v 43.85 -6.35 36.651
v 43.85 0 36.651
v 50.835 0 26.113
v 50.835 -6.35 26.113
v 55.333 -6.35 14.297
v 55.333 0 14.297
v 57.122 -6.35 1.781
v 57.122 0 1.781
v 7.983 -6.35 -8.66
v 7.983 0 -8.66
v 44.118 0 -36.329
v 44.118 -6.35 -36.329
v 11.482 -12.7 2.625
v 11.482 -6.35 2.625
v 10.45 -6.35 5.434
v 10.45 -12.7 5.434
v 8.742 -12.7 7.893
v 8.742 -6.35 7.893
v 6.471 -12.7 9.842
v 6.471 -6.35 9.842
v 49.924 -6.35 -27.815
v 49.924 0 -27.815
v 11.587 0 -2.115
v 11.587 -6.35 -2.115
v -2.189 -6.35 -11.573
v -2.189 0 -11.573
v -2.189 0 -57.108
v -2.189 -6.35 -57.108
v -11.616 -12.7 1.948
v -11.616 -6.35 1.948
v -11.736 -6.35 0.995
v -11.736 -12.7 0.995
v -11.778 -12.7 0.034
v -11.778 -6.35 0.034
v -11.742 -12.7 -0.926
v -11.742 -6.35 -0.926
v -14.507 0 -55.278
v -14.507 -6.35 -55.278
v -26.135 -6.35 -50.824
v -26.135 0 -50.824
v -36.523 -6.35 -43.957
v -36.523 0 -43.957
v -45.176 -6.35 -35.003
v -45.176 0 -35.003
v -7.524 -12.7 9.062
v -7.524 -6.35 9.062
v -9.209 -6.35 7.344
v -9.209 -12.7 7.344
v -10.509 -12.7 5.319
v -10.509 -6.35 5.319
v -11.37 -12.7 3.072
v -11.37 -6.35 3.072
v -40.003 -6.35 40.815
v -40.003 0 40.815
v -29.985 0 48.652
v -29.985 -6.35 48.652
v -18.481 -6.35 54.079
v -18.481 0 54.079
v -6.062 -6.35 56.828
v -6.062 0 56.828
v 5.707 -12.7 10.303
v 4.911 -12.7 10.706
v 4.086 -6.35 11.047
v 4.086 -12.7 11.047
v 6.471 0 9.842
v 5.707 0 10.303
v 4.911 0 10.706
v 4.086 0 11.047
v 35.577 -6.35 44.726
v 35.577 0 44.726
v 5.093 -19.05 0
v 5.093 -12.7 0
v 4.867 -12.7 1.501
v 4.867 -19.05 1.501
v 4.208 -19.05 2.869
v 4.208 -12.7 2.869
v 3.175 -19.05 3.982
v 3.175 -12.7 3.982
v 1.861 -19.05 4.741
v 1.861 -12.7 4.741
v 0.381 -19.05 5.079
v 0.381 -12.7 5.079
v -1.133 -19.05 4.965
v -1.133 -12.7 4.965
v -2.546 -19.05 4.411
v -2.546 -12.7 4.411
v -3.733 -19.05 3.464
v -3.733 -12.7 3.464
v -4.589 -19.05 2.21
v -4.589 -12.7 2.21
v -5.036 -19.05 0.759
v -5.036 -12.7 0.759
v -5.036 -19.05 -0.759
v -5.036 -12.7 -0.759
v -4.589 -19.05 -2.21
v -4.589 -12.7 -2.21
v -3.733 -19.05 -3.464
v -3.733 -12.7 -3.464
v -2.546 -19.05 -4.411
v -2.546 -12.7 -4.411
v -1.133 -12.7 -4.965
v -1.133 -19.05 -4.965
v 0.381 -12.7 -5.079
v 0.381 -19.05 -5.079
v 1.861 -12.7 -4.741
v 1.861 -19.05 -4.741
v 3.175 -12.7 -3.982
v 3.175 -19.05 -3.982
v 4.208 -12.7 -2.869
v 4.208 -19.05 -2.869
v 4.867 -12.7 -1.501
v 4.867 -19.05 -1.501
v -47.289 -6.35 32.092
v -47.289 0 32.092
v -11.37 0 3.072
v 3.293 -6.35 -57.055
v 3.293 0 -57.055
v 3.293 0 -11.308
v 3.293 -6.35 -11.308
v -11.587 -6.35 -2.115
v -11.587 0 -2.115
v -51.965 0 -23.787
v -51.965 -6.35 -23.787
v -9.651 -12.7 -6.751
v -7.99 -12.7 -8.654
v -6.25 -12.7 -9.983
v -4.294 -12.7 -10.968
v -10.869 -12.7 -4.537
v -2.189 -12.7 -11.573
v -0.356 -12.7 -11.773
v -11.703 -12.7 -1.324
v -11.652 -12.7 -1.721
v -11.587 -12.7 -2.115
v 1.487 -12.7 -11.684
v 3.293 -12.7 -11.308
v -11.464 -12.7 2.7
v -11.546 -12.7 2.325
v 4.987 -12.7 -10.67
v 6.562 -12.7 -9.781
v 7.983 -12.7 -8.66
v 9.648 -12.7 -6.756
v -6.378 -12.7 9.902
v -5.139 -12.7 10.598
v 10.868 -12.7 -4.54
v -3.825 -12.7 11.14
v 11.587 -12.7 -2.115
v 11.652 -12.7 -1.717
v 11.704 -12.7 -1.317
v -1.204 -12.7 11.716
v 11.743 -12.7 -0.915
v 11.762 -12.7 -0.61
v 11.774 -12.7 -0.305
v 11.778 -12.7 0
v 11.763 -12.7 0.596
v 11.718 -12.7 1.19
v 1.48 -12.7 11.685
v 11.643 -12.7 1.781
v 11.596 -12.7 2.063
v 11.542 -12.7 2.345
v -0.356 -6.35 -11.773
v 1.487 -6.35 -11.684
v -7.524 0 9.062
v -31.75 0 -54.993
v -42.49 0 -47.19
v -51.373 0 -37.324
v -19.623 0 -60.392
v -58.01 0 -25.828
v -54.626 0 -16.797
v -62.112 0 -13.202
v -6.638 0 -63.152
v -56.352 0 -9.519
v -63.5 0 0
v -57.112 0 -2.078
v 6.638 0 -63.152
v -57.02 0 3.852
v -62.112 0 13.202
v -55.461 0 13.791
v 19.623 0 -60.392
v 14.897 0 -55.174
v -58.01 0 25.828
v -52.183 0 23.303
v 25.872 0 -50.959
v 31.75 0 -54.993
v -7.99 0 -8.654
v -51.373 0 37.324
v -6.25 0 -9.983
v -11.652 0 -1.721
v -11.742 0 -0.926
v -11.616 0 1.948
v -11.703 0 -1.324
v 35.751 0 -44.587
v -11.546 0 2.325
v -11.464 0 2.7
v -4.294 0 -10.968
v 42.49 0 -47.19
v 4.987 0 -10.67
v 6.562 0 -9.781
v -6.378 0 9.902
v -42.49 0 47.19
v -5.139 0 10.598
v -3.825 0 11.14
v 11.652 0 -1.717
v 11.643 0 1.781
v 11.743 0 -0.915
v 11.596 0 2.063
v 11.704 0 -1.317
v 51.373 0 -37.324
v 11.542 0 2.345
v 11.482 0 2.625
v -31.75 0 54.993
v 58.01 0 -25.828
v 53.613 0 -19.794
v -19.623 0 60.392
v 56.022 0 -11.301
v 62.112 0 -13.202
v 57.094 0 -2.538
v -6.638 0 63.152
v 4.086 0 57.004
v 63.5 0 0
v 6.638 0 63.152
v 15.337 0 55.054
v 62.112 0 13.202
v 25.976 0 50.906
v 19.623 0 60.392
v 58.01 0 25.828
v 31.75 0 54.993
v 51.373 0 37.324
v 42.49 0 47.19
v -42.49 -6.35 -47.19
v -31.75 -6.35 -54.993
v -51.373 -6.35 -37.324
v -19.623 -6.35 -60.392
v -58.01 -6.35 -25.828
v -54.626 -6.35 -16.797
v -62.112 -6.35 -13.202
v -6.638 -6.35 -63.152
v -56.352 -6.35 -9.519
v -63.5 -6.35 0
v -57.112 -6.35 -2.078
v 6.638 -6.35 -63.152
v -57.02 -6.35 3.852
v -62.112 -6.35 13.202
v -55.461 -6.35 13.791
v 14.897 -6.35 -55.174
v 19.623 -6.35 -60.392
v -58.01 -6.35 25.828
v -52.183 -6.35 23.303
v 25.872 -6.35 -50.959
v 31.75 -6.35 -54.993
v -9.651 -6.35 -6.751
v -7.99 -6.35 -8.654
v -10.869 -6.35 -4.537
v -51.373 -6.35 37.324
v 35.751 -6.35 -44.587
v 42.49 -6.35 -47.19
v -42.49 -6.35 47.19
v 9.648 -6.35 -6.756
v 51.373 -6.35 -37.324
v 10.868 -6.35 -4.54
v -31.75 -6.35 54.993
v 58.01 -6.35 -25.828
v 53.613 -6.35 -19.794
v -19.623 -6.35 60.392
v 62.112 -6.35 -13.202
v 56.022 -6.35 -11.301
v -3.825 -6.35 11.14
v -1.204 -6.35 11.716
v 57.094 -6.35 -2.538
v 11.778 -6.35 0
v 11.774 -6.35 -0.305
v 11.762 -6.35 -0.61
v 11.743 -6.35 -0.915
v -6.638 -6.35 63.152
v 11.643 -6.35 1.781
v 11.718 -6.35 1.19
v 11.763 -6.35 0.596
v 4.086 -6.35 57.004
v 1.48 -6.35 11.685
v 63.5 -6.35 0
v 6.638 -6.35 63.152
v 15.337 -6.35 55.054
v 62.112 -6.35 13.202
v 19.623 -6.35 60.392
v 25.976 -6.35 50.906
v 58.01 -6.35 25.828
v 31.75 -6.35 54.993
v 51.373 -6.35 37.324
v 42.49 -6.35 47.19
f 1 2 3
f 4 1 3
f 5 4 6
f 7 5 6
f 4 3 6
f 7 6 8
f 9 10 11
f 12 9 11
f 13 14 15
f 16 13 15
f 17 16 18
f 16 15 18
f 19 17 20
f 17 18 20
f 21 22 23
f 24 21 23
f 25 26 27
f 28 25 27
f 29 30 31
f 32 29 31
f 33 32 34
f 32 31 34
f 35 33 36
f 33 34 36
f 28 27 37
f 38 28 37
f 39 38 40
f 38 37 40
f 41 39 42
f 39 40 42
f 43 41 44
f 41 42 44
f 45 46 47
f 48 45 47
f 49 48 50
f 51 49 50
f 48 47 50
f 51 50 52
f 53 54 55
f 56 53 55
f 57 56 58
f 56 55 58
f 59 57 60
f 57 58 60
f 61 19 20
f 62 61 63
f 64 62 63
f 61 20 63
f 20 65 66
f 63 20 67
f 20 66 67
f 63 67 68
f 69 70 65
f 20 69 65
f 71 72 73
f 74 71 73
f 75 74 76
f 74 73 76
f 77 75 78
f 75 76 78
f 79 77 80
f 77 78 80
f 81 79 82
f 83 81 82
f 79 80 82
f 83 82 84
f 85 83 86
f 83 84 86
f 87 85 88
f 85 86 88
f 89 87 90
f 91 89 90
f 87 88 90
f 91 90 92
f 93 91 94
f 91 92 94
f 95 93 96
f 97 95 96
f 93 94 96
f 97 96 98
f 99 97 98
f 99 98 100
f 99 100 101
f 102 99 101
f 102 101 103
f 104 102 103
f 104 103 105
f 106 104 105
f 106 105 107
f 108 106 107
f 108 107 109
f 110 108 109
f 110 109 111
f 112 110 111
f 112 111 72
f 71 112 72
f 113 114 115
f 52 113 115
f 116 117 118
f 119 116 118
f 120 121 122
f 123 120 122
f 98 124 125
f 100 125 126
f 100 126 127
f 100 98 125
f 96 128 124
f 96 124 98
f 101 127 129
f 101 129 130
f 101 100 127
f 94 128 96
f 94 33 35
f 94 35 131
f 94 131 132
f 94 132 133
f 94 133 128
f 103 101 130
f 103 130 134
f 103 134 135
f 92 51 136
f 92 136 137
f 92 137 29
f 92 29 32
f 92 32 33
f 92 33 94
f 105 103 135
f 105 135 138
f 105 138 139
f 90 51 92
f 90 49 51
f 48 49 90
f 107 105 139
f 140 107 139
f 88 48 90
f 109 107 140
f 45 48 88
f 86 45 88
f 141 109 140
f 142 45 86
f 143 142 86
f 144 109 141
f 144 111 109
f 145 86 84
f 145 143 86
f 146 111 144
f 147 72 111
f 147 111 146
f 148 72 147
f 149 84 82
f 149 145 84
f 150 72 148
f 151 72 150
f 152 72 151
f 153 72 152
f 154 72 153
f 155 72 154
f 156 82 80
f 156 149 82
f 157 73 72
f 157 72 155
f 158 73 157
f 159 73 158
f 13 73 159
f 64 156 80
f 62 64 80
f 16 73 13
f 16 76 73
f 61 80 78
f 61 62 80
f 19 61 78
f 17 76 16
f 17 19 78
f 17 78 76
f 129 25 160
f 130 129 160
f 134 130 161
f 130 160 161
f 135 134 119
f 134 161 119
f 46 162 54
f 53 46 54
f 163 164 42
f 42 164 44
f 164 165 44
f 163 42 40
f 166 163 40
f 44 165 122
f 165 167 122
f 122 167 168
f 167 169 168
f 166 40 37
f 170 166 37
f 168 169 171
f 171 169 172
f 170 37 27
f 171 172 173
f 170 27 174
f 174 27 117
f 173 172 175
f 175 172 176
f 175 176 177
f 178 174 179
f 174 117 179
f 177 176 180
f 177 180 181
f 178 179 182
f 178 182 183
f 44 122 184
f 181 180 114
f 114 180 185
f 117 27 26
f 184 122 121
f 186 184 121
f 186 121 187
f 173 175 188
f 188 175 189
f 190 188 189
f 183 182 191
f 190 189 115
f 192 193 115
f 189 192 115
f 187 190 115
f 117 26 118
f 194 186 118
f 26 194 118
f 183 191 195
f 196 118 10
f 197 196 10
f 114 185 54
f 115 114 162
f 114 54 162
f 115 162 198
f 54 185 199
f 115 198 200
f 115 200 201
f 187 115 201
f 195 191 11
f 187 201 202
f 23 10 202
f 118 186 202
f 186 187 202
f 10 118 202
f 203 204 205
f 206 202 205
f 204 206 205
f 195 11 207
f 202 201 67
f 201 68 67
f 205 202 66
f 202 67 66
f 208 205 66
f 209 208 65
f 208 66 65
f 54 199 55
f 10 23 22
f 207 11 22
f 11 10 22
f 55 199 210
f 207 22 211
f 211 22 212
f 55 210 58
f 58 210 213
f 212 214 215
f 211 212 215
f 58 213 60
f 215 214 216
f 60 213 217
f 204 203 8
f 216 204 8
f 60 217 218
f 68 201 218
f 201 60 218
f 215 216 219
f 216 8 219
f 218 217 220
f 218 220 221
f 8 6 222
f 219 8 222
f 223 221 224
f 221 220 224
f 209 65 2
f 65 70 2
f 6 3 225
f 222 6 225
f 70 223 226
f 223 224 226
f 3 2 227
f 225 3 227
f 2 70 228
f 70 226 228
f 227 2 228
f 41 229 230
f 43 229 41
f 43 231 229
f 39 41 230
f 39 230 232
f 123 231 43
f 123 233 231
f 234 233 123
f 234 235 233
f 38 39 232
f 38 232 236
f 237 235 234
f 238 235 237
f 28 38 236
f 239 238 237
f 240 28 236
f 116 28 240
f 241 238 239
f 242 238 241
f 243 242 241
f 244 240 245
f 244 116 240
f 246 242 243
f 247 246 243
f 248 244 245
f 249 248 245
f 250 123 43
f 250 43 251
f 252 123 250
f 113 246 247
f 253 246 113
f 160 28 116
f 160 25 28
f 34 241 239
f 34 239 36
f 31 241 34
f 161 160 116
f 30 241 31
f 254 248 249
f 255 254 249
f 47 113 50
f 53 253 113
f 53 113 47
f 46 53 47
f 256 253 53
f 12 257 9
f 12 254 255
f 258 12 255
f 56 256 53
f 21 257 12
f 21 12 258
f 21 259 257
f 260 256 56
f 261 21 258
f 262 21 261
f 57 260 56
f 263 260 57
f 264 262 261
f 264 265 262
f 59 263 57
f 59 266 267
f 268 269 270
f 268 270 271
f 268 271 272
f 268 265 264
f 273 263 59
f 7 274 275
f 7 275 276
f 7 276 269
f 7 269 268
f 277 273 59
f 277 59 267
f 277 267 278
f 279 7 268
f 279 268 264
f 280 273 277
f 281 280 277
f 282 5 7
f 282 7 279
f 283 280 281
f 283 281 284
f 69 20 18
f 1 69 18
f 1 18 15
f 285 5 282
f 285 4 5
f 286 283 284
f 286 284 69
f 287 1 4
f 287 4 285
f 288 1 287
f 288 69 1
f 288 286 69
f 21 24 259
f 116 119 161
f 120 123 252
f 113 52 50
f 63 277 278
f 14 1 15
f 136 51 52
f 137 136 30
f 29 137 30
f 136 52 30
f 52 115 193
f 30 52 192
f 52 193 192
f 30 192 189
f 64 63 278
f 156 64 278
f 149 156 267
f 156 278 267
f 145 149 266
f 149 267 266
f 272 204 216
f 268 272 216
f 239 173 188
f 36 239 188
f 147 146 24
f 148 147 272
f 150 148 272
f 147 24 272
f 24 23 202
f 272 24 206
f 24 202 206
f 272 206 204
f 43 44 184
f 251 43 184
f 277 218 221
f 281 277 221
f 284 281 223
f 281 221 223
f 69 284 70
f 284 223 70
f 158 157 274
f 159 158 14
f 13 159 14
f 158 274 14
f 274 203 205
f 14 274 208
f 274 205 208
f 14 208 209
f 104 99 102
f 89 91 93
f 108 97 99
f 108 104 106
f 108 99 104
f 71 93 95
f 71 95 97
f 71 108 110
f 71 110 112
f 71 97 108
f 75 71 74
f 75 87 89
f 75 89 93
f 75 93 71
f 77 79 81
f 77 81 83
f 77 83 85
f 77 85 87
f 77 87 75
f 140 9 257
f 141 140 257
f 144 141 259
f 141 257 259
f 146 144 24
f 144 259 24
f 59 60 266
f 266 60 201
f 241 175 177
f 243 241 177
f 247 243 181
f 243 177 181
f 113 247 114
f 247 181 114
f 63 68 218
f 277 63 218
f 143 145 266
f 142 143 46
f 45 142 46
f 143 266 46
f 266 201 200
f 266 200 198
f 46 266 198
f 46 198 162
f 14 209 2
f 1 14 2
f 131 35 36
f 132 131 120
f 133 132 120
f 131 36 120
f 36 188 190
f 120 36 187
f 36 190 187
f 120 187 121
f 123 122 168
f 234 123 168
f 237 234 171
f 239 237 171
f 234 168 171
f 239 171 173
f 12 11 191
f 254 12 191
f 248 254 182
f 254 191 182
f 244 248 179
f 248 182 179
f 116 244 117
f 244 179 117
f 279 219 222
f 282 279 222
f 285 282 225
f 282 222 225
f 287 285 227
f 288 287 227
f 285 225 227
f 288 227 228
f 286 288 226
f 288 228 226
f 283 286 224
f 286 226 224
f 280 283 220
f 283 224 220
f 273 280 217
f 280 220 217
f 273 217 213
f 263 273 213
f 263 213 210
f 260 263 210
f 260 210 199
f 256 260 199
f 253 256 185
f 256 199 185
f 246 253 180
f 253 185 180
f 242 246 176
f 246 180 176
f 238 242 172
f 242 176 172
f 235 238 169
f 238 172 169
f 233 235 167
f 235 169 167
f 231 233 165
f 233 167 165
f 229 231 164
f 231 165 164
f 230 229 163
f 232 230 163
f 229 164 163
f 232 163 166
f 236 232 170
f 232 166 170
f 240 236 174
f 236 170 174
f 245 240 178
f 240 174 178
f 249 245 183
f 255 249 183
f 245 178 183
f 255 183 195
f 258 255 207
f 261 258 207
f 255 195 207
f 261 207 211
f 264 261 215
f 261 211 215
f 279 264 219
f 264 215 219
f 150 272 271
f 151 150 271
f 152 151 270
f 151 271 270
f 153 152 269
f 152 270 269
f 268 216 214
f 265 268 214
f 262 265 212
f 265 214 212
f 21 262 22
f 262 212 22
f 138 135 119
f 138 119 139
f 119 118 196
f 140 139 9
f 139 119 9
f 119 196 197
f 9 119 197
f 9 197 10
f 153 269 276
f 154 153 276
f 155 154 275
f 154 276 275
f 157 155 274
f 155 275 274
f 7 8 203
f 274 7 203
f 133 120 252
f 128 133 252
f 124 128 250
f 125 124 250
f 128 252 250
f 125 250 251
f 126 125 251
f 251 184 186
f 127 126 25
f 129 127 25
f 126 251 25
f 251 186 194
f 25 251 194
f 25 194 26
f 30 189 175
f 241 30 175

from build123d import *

# Parameters (mm, degrees)
F0_R     = 63.5
F1_DEPTH = 6.35
F0_R_2   = 5.092997
F2_DEPTH = 12.7
F3_DEPTH = 19.05


with BuildPart() as f1:
    # F0 (on Front) → F1 (new body)
    with BuildSketch(Plane.XZ):
        Circle(F0_R)
        with BuildLine():
            ThreePointArc((57.122257, 1.780511), (57.143064, 0.890363), (57.15, 0))
            ThreePointArc((57.15, 0), (57.135905, -1.269183), (57.093628, -2.537739))
            ThreePointArc((57.093628, -2.537739), (54.98137, -15.593956), (49.924429, -27.814994))
            ThreePointArc((49.924429, -27.814994), (47.213271, -32.202943), (44.117535, -36.328579))
            ThreePointArc((44.117535, -36.328579), (25.871512, -50.958683), (3.292949, -57.055052))
            ThreePointArc((3.292949, -57.055052), (0.552387, -57.14733), (-2.189447, -57.108045))
            ThreePointArc((-2.189447, -57.108045), (-26.134958, -50.824074), (-45.176341, -35.003153))
            ThreePointArc((-45.176341, -35.003153), (-48.893175, -29.5902), (-51.964588, -23.786636))
            ThreePointArc((-51.964588, -23.786636), (-55.608023, -13.185989), (-57.112206, -2.078074))
            ThreePointArc((-57.112206, -2.078074), (-57.143101, 0.887966), (-57.020063, 3.851614))
            ThreePointArc((-57.020063, 3.851614), (-54.031986, 18.618995), (-47.288543, 32.092307))
            ThreePointArc((-47.288543, 32.092307), (-43.8631, 36.635378), (-40.002895, 40.815327))
            ThreePointArc((-40.002895, 40.815327), (-24.384219, 51.686868), (-6.061928, 56.827595))
            ThreePointArc((-6.061928, 56.827595), (-0.991719, 57.141395), (4.086326, 57.003723))
            ThreePointArc((4.086326, 57.003723), (20.760172, 53.246012), (35.57713, 44.725723))
            ThreePointArc((35.57713, 44.725723), (39.918168, 40.898195), (43.84984, 36.651249))
            ThreePointArc((43.84984, 36.651249), (53.41192, 20.329518), (57.122257, 1.780511))
        make_face(mode=Mode.SUBTRACT)
        with BuildLine():
            Line((-7.523903, 9.061736), (-40.002895, 40.815327))
            ThreePointArc((-40.002895, 40.815327), (-43.8631, 36.635378), (-47.288543, 32.092307))
            Line((-47.288543, 32.092307), (-11.370419, 3.072091))
            ThreePointArc((-11.370419, 3.072091), (-9.91049, 6.364461), (-7.523903, 9.061736))
        make_face()
        with BuildLine():
            Line((-11.615889, 1.948155), (-57.020063, 3.851614))
            ThreePointArc((-57.020063, 3.851614), (-57.143101, 0.887966), (-57.112206, -2.078074))
            Line((-57.112206, -2.078074), (-11.741675, -0.925877))
            ThreePointArc((-11.741675, -0.925877), (-11.766858, 0.514994), (-11.615889, 1.948155))
        make_face()
        with BuildLine():
            ThreePointArc((-51.964588, -23.786636), (-48.893175, -29.5902), (-45.176341, -35.003153))
            Line((-45.176341, -35.003153), (-7.989839, -8.653707))
            ThreePointArc((-7.989839, -8.653707), (-10.319767, -5.676847), (-11.586634, -2.115202))
            Line((-11.586634, -2.115202), (-51.964588, -23.786636))
        make_face()
        with BuildLine():
            ThreePointArc((44.117535, -36.328579), (47.213271, -32.202943), (49.924429, -27.814994))
            Line((49.924429, -27.814994), (11.586634, -2.115202))
            ThreePointArc((11.586634, -2.115202), (10.317636, -5.680719), (7.983341, -8.659702))
            Line((7.983341, -8.659702), (44.117535, -36.328579))
        make_face()
        with BuildLine():
            Line((11.481925, 2.6248), (43.84984, 36.651249))
            ThreePointArc((43.84984, 36.651249), (39.918168, 40.898195), (35.57713, 44.725723))
            Line((35.57713, 44.725723), (6.470598, 9.841521))
            ThreePointArc((6.470598, 9.841521), (9.674375, 6.717935), (11.481925, 2.6248))
        make_face()
        with BuildLine():
            Line((4.086326, 11.046543), (4.086326, 57.003723))
            ThreePointArc((4.086326, 57.003723), (-0.991719, 57.141395), (-6.061928, 56.827595))
            Line((-6.061928, 56.827595), (-3.825, 11.139728))
            ThreePointArc((-3.825, 11.139728), (0.138722, 11.777306), (4.086326, 11.046543))
        make_face()
        with BuildLine():
            ThreePointArc((57.093628, -2.537739), (57.135905, -1.269183), (57.15, 0))
            ThreePointArc((57.15, 0), (57.143064, 0.890363), (57.122257, 1.780511))
            Line((57.122257, 1.780511), (11.642764, 1.780511))
            ThreePointArc((11.642764, 1.780511), (11.744234, 0.892824), (11.778123, 0))
            ThreePointArc((11.778123, 0), (11.769223, -0.457783), (11.742537, -0.914875))
            Line((11.742537, -0.914875), (57.093628, -2.537739))
        make_face()
        with BuildLine():
            ThreePointArc((-2.189447, -57.108045), (0.552387, -57.14733), (3.292949, -57.055052))
            Line((3.292949, -57.055052), (3.292949, -11.308433))
            ThreePointArc((3.292949, -11.308433), (0.567368, -11.764449), (-2.189447, -11.572835))
            Line((-2.189447, -11.572835), (-2.189447, -57.108045))
        make_face()
    extrude(amount=F1_DEPTH)

    # F0 (on Front) → F2 (join)
    with BuildSketch(Plane.XZ):
        with BuildLine():
            ThreePointArc((11.778123, 0), (11.744234, 0.892824), (11.642764, 1.780511))
            ThreePointArc((11.642764, 1.780511), (11.570048, 2.204123), (11.481925, 2.6248))
            ThreePointArc((11.481925, 2.6248), (9.674375, 6.717935), (6.470598, 9.841521))
            ThreePointArc((6.470598, 9.841521), (5.312737, 10.51185), (4.086326, 11.046543))
            ThreePointArc((4.086326, 11.046543), (0.138722, 11.777306), (-3.825, 11.139728))
            ThreePointArc((-3.825, 11.139728), (-5.768788, 10.268654), (-7.523903, 9.061736))
            ThreePointArc((-7.523903, 9.061736), (-9.91049, 6.364461), (-11.370419, 3.072091))
            ThreePointArc((-11.370419, 3.072091), (-11.506885, 2.513122), (-11.615889, 1.948155))
            ThreePointArc((-11.615889, 1.948155), (-11.766858, 0.514994), (-11.741675, -0.925877))
            ThreePointArc((-11.741675, -0.925877), (-11.679303, -1.522514), (-11.586634, -2.115202))
            ThreePointArc((-11.586634, -2.115202), (-10.319767, -5.676847), (-7.989839, -8.653707))
            ThreePointArc((-7.989839, -8.653707), (-5.294789, -10.520902), (-2.189447, -11.572835))
            ThreePointArc((-2.189447, -11.572835), (0.567368, -11.764449), (3.292949, -11.308433))
            ThreePointArc((3.292949, -11.308433), (5.7916, -10.255806), (7.983341, -8.659702))
            ThreePointArc((7.983341, -8.659702), (10.317636, -5.680719), (11.586634, -2.115202))
            ThreePointArc((11.586634, -2.115202), (11.680015, -1.517042), (11.742537, -0.914875))
            ThreePointArc((11.742537, -0.914875), (11.769223, -0.457783), (11.778123, 0))
        make_face()
        Circle(F0_R_2, mode=Mode.SUBTRACT)
    extrude(amount=F2_DEPTH)

    # F0 (on Front) → F3 (join)
    with BuildSketch(Plane.XZ):
        Circle(F0_R_2)
    extrude(amount=F3_DEPTH)


solid = f1.part
